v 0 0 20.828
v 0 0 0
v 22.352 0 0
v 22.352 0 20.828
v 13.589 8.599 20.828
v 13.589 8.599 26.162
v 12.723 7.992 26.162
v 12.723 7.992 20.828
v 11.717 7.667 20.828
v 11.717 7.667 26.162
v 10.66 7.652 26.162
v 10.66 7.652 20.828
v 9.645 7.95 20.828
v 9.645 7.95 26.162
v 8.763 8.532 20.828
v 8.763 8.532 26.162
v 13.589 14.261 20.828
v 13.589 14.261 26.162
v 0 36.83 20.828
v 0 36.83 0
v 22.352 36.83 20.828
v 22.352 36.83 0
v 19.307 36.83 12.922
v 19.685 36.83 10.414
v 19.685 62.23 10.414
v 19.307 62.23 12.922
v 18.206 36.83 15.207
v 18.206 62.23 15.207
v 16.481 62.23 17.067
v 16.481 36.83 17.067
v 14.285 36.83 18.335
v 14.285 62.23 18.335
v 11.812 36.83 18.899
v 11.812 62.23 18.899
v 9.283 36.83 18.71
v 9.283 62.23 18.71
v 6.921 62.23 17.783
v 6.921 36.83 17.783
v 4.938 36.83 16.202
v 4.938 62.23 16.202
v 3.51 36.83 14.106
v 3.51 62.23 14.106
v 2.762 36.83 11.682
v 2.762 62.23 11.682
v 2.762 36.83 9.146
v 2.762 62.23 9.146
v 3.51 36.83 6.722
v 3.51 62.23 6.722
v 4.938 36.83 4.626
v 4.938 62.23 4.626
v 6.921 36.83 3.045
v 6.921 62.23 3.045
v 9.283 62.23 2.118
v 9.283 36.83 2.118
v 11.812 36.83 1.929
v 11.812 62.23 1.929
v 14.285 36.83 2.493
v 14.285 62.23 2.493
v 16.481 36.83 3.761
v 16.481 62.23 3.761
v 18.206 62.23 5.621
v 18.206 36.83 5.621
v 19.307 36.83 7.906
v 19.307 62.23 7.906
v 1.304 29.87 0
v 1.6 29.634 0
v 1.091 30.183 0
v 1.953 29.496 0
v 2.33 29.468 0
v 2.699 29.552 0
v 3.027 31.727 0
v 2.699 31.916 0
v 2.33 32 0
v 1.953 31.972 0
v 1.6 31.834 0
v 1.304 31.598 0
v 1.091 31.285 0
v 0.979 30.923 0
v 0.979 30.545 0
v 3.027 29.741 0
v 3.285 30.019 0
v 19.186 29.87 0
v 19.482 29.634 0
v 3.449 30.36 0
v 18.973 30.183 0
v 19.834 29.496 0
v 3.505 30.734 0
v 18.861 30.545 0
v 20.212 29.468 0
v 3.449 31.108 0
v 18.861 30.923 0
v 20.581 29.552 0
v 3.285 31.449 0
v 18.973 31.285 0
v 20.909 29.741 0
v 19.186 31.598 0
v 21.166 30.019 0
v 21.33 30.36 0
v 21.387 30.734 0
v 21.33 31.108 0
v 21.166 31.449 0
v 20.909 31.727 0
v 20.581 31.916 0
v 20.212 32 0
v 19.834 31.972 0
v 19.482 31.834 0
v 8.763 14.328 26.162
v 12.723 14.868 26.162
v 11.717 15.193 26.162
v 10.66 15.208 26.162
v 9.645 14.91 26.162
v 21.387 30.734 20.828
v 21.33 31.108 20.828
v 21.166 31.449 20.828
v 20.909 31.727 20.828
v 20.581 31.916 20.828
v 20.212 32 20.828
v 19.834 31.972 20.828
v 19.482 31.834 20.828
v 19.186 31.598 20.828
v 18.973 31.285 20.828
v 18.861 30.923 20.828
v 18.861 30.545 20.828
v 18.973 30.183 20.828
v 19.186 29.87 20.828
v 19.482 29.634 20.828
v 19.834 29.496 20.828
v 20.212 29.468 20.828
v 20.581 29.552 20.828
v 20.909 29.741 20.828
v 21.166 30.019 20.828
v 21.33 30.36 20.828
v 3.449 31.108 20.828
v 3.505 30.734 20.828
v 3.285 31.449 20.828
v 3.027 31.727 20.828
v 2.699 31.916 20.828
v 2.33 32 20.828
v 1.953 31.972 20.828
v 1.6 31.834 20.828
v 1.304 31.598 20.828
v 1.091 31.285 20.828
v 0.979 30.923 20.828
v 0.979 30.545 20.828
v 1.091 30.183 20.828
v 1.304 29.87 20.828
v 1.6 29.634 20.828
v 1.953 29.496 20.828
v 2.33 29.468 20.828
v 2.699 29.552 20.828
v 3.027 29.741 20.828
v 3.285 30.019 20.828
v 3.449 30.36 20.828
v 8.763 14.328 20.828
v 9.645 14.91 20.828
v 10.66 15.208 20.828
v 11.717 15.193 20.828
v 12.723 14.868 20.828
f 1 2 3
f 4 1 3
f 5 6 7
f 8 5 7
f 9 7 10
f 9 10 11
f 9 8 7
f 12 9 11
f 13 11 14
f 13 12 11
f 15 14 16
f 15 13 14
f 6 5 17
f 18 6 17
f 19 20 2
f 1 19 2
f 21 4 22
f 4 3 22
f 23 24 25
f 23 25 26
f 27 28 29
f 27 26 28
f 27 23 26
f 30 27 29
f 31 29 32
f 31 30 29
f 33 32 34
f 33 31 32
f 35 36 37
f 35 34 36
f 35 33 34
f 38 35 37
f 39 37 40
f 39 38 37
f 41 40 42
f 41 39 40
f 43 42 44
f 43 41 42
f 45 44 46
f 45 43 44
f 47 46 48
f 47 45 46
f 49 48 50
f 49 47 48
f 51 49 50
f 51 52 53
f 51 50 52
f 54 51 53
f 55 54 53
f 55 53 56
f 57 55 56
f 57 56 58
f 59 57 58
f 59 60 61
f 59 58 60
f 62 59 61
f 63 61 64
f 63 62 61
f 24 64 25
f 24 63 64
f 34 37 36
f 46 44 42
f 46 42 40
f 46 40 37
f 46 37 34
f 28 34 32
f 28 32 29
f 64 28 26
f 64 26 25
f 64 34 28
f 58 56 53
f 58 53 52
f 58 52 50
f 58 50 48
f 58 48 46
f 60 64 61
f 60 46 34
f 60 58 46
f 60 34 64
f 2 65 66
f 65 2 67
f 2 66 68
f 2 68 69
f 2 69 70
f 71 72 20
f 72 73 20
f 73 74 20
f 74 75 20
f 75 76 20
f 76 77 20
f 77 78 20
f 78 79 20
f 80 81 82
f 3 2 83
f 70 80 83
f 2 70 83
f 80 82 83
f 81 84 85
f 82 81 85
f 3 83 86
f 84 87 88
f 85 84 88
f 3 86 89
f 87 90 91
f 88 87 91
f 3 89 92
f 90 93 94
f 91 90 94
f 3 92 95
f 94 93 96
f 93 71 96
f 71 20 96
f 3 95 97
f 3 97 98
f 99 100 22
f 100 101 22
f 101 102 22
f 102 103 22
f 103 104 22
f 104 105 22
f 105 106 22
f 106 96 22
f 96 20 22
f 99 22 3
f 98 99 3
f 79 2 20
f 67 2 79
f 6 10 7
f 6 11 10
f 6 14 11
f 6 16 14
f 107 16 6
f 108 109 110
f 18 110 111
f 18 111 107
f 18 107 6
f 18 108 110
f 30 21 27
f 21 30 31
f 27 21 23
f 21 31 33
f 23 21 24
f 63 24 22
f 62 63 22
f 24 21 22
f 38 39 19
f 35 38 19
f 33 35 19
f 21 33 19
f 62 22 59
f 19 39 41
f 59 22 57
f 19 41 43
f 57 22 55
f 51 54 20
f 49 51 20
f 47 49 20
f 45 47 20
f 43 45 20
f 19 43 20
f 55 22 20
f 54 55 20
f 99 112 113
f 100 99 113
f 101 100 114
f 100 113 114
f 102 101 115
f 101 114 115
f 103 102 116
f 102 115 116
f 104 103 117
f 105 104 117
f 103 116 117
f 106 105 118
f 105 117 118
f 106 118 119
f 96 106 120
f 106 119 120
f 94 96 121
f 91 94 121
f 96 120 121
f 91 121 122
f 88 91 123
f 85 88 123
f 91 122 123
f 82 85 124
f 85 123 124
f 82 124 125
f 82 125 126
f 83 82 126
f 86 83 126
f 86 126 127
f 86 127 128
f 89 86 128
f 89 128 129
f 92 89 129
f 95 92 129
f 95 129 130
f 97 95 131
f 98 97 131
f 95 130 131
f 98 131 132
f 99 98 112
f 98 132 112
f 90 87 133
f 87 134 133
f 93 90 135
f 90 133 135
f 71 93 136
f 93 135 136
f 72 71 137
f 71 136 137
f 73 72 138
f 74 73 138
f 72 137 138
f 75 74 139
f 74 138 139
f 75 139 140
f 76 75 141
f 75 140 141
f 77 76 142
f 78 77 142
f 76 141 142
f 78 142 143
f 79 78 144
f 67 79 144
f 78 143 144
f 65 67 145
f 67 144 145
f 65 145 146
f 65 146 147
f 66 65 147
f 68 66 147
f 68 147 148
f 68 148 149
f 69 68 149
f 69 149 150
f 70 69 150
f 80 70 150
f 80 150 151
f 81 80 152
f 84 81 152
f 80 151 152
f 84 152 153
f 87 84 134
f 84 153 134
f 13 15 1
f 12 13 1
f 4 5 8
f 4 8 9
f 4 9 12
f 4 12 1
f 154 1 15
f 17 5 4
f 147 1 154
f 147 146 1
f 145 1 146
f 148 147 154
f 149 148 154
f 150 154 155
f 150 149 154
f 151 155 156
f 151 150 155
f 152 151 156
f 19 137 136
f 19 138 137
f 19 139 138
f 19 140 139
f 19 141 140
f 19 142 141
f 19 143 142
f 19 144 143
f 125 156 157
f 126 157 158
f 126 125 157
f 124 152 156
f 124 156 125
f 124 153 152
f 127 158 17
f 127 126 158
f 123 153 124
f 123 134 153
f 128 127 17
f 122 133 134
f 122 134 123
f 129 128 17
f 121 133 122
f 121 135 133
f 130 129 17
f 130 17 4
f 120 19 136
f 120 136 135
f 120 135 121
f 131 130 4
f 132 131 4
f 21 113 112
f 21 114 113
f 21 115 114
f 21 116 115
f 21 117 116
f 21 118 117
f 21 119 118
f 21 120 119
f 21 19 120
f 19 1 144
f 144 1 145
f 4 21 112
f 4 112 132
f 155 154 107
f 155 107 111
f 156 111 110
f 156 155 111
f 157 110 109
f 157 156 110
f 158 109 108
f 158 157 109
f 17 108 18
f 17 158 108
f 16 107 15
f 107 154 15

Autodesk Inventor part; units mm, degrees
ref_plane "YZ Plane" through (0, 0, 0) normal (1, 0, 0) x (0, 1, 0)
ref_plane "XZ Plane" through (0, 0, 0) normal (0, 1, 0) x (-1, 0, 0)
ref_plane "XY Plane" through (0, 0, 0) normal (0, 0, 1) x (1, 0, 0)
sketch "Sketch1" plane through (0, 0, 0) normal (0, 0, 1) x (1, 0, 0)
  line L0 (0, 0) -> (22.352, 0)
  line L1 (22.352, 0) -> (22.352, 36.83)
  line L2 (22.352, 36.83) -> (0, 36.83)
  line L3 (0, 36.83) -> (0, 0)
  dimension "d0" = 22.352
  dimension "d1" = 36.83
extrude "Extrusion1" add sketch "Sketch1" along normal blind 20.828
sketch "Sketch2" plane through (0, 36.83, 0) normal (0, 1, 0) x (1, 0, 0)
  circle A0 centre (11.176, -10.414) radius 8.509
  point P0 (0, 0)
  dimension "d4" = 17.018
extrude "Extrusion2" add sketch "Sketch2" along normal blind 25.4
sketch "Sketch3" plane through (0, 0, 0) normal (0, 0, -1) x (-1, 0, 0)
  point P0 (0, 0)
sketch "Sketch4" plane through (0, 0, 20.828) normal (0, 0, 1) x (1, 0, 0)
  line L0 (22.352, 36.83) -> (0, 36.83) projected
  line L1 (0, 36.83) -> (0, 0) projected
  circle A0 centre (2.2352, 30.734) radius 1.27
  line L2 (22.352, 0) -> (22.352, 36.83) projected
  circle A1 centre (20.1168, 30.734) radius 1.27
  dimension "d9" = 2.54
  dimension "d12" = 2.54
extrude "Extrusion3" cut sketch "Sketch4" against normal blind 25.4
sketch "Sketch5" plane through (0, 0, 0) normal (0, 0, -1) x (-1, 0, 0)
  point P0 (0, 0)
sketch "Sketch6" plane through (0, 0, 20.828) normal (0, 0, 1) x (1, 0, 0)
  line L0 (0, 0) -> (22.352, 0) projected
  line L1 (11.176, 0) -> (11.176, 7.62)
  line L2 (22.352, 0) -> (22.352, 11.43)
  line L3 (22.352, 11.43) -> (13.589, 11.43)
  line L4 (0, 11.43) -> (8.763, 11.43)
  line L5 (13.589, 8.5992) -> (13.589, 14.2608)
  line L6 (8.763, 14.3275) -> (8.763, 8.5325)
  line L7 (8.763, 7.6515) -> (13.589, 15.2085) construction
  line L8 (13.589, 7.6515) -> (8.763, 15.2085) construction
  arc A0 (8.763, 8.5325) -> (13.589, 8.5992) centre (11.14, 11.1716) ccw
  arc A1 (13.589, 14.2608) -> (8.763, 14.3275) centre (11.14, 11.6884) ccw
  point P0 (11.176, 11.43)
  dimension "d16" = 7.62
  dimension "d17" = 11.43
  dimension "d18" = 8.763
extrude "Extrusion4" add sketch "Sketch6" along normal blind 5.334 contours A0 L6 A1 L5
properties part number "msheehan_motor"
